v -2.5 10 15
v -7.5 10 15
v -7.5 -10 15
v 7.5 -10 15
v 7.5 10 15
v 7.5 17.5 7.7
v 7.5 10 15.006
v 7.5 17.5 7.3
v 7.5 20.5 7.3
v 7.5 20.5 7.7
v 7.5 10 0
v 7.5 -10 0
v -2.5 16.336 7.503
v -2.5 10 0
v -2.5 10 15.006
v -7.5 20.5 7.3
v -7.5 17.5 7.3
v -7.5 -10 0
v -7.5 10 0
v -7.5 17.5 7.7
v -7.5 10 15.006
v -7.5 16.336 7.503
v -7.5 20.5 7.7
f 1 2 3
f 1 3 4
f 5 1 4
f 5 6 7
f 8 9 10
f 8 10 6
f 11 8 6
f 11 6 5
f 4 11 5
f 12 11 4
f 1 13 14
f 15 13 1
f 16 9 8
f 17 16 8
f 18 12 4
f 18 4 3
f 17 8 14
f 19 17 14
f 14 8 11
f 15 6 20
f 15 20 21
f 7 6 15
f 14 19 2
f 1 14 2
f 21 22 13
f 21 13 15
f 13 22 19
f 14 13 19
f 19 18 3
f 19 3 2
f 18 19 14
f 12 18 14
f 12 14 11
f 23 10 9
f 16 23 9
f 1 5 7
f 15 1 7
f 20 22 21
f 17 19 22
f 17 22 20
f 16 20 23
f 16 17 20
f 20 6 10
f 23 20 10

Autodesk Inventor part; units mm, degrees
ref_plane "YZ Plane" through (0, 0, 0) normal (1, 0, 0) x (0, 1, 0)
ref_plane "XZ Plane" through (0, 0, 0) normal (0, 1, 0) x (-1, 0, 0)
ref_plane "XY Plane" through (0, 0, 0) normal (0, 0, 1) x (1, 0, 0)
sketch "草圖1" plane through (0, 0, 0) normal (0, 0, 1) x (1, 0, 0)
  line L0 (-7.5, 10) -> (7.5, 10)
  line L1 (7.5, 10) -> (7.5, -10)
  line L2 (7.5, -10) -> (-7.5, -10)
  line L3 (-7.5, -10) -> (-7.5, 10)
  line L4 (-7.5, 10) -> (7.5, -10) construction
  line L5 (7.5, 10) -> (-7.5, -10) construction
  point P0 (0, 0)
  dimension "d0" = 15
  dimension "d1" = 20
extrude "擠出1" add sketch "草圖1" along normal blind 15
sketch "草圖2" plane through (-7.5, 10, 0) normal (0, 1, 0) x (1, 0, 0)
  line L0 (0, 0) -> (0, -15) projected
  line L1 (0, -7.5) -> (15, -7.5)
  line L2 (15, 0) -> (15, -15) projected
  point P0 (7.5, 0)
sketch "草圖3" plane through (7.5, -10, 0) normal (1, 0, 0) x (0, 0, -1)
  line L0 (0, 0) -> (0, 20) projected
  line L1 (0, 20) -> (-15, 20) projected
  line L2 (-15, 0) -> (-15, 20) projected
  line L3 (-15, 20) -> (0, 20)
  line L4 (-7.5, 27.5) -> (-7.3, 27.5)
  line L5 (-7.5, 27.5) -> (-7.7, 27.5)
  line L6 (-7.3, 27.5) -> (0, 20)
  line L7 (-7.7, 27.5) -> (-15.0055, 20)
  line L8 (-7.7, 27.5) -> (-7.7, 30.5)
  line L9 (-7.7, 30.5) -> (-7.3, 30.5)
  line L10 (-7.3, 30.5) -> (-7.3, 27.5)
  line L11 (-15.0055, 20) -> (0, 20)
  point P0 (0, 10)
  point P1 (-7.5, 20)
  dimension "d4" = 7.5
  dimension "d5" = 0.2
  dimension "d6" = 3
extrude "擠出3" add sketch "草圖3" against normal blind 15
sketch "草圖4" plane through (-7.5, -10, 0) normal (-1, 0, 0) x (0, 0, 1)
  line L0 (0, 20) -> (7.3, 27.5) projected
  line L1 (0, 20) -> (15.0055, 20)
  line L2 (15.0055, 20) -> (7.5027, 20)
  line L3 (7.3, 30.5) -> (7.3, 27.5) projected
  line L4 (7.5027, 26.3355) -> (0, 20)
  line L5 (7.5027, 26.3355) -> (15.0055, 20)
  point P0 (0, 10)
extrude "擠出4" cut sketch "草圖4" against normal blind 5
properties part number "牛奶瓶"
